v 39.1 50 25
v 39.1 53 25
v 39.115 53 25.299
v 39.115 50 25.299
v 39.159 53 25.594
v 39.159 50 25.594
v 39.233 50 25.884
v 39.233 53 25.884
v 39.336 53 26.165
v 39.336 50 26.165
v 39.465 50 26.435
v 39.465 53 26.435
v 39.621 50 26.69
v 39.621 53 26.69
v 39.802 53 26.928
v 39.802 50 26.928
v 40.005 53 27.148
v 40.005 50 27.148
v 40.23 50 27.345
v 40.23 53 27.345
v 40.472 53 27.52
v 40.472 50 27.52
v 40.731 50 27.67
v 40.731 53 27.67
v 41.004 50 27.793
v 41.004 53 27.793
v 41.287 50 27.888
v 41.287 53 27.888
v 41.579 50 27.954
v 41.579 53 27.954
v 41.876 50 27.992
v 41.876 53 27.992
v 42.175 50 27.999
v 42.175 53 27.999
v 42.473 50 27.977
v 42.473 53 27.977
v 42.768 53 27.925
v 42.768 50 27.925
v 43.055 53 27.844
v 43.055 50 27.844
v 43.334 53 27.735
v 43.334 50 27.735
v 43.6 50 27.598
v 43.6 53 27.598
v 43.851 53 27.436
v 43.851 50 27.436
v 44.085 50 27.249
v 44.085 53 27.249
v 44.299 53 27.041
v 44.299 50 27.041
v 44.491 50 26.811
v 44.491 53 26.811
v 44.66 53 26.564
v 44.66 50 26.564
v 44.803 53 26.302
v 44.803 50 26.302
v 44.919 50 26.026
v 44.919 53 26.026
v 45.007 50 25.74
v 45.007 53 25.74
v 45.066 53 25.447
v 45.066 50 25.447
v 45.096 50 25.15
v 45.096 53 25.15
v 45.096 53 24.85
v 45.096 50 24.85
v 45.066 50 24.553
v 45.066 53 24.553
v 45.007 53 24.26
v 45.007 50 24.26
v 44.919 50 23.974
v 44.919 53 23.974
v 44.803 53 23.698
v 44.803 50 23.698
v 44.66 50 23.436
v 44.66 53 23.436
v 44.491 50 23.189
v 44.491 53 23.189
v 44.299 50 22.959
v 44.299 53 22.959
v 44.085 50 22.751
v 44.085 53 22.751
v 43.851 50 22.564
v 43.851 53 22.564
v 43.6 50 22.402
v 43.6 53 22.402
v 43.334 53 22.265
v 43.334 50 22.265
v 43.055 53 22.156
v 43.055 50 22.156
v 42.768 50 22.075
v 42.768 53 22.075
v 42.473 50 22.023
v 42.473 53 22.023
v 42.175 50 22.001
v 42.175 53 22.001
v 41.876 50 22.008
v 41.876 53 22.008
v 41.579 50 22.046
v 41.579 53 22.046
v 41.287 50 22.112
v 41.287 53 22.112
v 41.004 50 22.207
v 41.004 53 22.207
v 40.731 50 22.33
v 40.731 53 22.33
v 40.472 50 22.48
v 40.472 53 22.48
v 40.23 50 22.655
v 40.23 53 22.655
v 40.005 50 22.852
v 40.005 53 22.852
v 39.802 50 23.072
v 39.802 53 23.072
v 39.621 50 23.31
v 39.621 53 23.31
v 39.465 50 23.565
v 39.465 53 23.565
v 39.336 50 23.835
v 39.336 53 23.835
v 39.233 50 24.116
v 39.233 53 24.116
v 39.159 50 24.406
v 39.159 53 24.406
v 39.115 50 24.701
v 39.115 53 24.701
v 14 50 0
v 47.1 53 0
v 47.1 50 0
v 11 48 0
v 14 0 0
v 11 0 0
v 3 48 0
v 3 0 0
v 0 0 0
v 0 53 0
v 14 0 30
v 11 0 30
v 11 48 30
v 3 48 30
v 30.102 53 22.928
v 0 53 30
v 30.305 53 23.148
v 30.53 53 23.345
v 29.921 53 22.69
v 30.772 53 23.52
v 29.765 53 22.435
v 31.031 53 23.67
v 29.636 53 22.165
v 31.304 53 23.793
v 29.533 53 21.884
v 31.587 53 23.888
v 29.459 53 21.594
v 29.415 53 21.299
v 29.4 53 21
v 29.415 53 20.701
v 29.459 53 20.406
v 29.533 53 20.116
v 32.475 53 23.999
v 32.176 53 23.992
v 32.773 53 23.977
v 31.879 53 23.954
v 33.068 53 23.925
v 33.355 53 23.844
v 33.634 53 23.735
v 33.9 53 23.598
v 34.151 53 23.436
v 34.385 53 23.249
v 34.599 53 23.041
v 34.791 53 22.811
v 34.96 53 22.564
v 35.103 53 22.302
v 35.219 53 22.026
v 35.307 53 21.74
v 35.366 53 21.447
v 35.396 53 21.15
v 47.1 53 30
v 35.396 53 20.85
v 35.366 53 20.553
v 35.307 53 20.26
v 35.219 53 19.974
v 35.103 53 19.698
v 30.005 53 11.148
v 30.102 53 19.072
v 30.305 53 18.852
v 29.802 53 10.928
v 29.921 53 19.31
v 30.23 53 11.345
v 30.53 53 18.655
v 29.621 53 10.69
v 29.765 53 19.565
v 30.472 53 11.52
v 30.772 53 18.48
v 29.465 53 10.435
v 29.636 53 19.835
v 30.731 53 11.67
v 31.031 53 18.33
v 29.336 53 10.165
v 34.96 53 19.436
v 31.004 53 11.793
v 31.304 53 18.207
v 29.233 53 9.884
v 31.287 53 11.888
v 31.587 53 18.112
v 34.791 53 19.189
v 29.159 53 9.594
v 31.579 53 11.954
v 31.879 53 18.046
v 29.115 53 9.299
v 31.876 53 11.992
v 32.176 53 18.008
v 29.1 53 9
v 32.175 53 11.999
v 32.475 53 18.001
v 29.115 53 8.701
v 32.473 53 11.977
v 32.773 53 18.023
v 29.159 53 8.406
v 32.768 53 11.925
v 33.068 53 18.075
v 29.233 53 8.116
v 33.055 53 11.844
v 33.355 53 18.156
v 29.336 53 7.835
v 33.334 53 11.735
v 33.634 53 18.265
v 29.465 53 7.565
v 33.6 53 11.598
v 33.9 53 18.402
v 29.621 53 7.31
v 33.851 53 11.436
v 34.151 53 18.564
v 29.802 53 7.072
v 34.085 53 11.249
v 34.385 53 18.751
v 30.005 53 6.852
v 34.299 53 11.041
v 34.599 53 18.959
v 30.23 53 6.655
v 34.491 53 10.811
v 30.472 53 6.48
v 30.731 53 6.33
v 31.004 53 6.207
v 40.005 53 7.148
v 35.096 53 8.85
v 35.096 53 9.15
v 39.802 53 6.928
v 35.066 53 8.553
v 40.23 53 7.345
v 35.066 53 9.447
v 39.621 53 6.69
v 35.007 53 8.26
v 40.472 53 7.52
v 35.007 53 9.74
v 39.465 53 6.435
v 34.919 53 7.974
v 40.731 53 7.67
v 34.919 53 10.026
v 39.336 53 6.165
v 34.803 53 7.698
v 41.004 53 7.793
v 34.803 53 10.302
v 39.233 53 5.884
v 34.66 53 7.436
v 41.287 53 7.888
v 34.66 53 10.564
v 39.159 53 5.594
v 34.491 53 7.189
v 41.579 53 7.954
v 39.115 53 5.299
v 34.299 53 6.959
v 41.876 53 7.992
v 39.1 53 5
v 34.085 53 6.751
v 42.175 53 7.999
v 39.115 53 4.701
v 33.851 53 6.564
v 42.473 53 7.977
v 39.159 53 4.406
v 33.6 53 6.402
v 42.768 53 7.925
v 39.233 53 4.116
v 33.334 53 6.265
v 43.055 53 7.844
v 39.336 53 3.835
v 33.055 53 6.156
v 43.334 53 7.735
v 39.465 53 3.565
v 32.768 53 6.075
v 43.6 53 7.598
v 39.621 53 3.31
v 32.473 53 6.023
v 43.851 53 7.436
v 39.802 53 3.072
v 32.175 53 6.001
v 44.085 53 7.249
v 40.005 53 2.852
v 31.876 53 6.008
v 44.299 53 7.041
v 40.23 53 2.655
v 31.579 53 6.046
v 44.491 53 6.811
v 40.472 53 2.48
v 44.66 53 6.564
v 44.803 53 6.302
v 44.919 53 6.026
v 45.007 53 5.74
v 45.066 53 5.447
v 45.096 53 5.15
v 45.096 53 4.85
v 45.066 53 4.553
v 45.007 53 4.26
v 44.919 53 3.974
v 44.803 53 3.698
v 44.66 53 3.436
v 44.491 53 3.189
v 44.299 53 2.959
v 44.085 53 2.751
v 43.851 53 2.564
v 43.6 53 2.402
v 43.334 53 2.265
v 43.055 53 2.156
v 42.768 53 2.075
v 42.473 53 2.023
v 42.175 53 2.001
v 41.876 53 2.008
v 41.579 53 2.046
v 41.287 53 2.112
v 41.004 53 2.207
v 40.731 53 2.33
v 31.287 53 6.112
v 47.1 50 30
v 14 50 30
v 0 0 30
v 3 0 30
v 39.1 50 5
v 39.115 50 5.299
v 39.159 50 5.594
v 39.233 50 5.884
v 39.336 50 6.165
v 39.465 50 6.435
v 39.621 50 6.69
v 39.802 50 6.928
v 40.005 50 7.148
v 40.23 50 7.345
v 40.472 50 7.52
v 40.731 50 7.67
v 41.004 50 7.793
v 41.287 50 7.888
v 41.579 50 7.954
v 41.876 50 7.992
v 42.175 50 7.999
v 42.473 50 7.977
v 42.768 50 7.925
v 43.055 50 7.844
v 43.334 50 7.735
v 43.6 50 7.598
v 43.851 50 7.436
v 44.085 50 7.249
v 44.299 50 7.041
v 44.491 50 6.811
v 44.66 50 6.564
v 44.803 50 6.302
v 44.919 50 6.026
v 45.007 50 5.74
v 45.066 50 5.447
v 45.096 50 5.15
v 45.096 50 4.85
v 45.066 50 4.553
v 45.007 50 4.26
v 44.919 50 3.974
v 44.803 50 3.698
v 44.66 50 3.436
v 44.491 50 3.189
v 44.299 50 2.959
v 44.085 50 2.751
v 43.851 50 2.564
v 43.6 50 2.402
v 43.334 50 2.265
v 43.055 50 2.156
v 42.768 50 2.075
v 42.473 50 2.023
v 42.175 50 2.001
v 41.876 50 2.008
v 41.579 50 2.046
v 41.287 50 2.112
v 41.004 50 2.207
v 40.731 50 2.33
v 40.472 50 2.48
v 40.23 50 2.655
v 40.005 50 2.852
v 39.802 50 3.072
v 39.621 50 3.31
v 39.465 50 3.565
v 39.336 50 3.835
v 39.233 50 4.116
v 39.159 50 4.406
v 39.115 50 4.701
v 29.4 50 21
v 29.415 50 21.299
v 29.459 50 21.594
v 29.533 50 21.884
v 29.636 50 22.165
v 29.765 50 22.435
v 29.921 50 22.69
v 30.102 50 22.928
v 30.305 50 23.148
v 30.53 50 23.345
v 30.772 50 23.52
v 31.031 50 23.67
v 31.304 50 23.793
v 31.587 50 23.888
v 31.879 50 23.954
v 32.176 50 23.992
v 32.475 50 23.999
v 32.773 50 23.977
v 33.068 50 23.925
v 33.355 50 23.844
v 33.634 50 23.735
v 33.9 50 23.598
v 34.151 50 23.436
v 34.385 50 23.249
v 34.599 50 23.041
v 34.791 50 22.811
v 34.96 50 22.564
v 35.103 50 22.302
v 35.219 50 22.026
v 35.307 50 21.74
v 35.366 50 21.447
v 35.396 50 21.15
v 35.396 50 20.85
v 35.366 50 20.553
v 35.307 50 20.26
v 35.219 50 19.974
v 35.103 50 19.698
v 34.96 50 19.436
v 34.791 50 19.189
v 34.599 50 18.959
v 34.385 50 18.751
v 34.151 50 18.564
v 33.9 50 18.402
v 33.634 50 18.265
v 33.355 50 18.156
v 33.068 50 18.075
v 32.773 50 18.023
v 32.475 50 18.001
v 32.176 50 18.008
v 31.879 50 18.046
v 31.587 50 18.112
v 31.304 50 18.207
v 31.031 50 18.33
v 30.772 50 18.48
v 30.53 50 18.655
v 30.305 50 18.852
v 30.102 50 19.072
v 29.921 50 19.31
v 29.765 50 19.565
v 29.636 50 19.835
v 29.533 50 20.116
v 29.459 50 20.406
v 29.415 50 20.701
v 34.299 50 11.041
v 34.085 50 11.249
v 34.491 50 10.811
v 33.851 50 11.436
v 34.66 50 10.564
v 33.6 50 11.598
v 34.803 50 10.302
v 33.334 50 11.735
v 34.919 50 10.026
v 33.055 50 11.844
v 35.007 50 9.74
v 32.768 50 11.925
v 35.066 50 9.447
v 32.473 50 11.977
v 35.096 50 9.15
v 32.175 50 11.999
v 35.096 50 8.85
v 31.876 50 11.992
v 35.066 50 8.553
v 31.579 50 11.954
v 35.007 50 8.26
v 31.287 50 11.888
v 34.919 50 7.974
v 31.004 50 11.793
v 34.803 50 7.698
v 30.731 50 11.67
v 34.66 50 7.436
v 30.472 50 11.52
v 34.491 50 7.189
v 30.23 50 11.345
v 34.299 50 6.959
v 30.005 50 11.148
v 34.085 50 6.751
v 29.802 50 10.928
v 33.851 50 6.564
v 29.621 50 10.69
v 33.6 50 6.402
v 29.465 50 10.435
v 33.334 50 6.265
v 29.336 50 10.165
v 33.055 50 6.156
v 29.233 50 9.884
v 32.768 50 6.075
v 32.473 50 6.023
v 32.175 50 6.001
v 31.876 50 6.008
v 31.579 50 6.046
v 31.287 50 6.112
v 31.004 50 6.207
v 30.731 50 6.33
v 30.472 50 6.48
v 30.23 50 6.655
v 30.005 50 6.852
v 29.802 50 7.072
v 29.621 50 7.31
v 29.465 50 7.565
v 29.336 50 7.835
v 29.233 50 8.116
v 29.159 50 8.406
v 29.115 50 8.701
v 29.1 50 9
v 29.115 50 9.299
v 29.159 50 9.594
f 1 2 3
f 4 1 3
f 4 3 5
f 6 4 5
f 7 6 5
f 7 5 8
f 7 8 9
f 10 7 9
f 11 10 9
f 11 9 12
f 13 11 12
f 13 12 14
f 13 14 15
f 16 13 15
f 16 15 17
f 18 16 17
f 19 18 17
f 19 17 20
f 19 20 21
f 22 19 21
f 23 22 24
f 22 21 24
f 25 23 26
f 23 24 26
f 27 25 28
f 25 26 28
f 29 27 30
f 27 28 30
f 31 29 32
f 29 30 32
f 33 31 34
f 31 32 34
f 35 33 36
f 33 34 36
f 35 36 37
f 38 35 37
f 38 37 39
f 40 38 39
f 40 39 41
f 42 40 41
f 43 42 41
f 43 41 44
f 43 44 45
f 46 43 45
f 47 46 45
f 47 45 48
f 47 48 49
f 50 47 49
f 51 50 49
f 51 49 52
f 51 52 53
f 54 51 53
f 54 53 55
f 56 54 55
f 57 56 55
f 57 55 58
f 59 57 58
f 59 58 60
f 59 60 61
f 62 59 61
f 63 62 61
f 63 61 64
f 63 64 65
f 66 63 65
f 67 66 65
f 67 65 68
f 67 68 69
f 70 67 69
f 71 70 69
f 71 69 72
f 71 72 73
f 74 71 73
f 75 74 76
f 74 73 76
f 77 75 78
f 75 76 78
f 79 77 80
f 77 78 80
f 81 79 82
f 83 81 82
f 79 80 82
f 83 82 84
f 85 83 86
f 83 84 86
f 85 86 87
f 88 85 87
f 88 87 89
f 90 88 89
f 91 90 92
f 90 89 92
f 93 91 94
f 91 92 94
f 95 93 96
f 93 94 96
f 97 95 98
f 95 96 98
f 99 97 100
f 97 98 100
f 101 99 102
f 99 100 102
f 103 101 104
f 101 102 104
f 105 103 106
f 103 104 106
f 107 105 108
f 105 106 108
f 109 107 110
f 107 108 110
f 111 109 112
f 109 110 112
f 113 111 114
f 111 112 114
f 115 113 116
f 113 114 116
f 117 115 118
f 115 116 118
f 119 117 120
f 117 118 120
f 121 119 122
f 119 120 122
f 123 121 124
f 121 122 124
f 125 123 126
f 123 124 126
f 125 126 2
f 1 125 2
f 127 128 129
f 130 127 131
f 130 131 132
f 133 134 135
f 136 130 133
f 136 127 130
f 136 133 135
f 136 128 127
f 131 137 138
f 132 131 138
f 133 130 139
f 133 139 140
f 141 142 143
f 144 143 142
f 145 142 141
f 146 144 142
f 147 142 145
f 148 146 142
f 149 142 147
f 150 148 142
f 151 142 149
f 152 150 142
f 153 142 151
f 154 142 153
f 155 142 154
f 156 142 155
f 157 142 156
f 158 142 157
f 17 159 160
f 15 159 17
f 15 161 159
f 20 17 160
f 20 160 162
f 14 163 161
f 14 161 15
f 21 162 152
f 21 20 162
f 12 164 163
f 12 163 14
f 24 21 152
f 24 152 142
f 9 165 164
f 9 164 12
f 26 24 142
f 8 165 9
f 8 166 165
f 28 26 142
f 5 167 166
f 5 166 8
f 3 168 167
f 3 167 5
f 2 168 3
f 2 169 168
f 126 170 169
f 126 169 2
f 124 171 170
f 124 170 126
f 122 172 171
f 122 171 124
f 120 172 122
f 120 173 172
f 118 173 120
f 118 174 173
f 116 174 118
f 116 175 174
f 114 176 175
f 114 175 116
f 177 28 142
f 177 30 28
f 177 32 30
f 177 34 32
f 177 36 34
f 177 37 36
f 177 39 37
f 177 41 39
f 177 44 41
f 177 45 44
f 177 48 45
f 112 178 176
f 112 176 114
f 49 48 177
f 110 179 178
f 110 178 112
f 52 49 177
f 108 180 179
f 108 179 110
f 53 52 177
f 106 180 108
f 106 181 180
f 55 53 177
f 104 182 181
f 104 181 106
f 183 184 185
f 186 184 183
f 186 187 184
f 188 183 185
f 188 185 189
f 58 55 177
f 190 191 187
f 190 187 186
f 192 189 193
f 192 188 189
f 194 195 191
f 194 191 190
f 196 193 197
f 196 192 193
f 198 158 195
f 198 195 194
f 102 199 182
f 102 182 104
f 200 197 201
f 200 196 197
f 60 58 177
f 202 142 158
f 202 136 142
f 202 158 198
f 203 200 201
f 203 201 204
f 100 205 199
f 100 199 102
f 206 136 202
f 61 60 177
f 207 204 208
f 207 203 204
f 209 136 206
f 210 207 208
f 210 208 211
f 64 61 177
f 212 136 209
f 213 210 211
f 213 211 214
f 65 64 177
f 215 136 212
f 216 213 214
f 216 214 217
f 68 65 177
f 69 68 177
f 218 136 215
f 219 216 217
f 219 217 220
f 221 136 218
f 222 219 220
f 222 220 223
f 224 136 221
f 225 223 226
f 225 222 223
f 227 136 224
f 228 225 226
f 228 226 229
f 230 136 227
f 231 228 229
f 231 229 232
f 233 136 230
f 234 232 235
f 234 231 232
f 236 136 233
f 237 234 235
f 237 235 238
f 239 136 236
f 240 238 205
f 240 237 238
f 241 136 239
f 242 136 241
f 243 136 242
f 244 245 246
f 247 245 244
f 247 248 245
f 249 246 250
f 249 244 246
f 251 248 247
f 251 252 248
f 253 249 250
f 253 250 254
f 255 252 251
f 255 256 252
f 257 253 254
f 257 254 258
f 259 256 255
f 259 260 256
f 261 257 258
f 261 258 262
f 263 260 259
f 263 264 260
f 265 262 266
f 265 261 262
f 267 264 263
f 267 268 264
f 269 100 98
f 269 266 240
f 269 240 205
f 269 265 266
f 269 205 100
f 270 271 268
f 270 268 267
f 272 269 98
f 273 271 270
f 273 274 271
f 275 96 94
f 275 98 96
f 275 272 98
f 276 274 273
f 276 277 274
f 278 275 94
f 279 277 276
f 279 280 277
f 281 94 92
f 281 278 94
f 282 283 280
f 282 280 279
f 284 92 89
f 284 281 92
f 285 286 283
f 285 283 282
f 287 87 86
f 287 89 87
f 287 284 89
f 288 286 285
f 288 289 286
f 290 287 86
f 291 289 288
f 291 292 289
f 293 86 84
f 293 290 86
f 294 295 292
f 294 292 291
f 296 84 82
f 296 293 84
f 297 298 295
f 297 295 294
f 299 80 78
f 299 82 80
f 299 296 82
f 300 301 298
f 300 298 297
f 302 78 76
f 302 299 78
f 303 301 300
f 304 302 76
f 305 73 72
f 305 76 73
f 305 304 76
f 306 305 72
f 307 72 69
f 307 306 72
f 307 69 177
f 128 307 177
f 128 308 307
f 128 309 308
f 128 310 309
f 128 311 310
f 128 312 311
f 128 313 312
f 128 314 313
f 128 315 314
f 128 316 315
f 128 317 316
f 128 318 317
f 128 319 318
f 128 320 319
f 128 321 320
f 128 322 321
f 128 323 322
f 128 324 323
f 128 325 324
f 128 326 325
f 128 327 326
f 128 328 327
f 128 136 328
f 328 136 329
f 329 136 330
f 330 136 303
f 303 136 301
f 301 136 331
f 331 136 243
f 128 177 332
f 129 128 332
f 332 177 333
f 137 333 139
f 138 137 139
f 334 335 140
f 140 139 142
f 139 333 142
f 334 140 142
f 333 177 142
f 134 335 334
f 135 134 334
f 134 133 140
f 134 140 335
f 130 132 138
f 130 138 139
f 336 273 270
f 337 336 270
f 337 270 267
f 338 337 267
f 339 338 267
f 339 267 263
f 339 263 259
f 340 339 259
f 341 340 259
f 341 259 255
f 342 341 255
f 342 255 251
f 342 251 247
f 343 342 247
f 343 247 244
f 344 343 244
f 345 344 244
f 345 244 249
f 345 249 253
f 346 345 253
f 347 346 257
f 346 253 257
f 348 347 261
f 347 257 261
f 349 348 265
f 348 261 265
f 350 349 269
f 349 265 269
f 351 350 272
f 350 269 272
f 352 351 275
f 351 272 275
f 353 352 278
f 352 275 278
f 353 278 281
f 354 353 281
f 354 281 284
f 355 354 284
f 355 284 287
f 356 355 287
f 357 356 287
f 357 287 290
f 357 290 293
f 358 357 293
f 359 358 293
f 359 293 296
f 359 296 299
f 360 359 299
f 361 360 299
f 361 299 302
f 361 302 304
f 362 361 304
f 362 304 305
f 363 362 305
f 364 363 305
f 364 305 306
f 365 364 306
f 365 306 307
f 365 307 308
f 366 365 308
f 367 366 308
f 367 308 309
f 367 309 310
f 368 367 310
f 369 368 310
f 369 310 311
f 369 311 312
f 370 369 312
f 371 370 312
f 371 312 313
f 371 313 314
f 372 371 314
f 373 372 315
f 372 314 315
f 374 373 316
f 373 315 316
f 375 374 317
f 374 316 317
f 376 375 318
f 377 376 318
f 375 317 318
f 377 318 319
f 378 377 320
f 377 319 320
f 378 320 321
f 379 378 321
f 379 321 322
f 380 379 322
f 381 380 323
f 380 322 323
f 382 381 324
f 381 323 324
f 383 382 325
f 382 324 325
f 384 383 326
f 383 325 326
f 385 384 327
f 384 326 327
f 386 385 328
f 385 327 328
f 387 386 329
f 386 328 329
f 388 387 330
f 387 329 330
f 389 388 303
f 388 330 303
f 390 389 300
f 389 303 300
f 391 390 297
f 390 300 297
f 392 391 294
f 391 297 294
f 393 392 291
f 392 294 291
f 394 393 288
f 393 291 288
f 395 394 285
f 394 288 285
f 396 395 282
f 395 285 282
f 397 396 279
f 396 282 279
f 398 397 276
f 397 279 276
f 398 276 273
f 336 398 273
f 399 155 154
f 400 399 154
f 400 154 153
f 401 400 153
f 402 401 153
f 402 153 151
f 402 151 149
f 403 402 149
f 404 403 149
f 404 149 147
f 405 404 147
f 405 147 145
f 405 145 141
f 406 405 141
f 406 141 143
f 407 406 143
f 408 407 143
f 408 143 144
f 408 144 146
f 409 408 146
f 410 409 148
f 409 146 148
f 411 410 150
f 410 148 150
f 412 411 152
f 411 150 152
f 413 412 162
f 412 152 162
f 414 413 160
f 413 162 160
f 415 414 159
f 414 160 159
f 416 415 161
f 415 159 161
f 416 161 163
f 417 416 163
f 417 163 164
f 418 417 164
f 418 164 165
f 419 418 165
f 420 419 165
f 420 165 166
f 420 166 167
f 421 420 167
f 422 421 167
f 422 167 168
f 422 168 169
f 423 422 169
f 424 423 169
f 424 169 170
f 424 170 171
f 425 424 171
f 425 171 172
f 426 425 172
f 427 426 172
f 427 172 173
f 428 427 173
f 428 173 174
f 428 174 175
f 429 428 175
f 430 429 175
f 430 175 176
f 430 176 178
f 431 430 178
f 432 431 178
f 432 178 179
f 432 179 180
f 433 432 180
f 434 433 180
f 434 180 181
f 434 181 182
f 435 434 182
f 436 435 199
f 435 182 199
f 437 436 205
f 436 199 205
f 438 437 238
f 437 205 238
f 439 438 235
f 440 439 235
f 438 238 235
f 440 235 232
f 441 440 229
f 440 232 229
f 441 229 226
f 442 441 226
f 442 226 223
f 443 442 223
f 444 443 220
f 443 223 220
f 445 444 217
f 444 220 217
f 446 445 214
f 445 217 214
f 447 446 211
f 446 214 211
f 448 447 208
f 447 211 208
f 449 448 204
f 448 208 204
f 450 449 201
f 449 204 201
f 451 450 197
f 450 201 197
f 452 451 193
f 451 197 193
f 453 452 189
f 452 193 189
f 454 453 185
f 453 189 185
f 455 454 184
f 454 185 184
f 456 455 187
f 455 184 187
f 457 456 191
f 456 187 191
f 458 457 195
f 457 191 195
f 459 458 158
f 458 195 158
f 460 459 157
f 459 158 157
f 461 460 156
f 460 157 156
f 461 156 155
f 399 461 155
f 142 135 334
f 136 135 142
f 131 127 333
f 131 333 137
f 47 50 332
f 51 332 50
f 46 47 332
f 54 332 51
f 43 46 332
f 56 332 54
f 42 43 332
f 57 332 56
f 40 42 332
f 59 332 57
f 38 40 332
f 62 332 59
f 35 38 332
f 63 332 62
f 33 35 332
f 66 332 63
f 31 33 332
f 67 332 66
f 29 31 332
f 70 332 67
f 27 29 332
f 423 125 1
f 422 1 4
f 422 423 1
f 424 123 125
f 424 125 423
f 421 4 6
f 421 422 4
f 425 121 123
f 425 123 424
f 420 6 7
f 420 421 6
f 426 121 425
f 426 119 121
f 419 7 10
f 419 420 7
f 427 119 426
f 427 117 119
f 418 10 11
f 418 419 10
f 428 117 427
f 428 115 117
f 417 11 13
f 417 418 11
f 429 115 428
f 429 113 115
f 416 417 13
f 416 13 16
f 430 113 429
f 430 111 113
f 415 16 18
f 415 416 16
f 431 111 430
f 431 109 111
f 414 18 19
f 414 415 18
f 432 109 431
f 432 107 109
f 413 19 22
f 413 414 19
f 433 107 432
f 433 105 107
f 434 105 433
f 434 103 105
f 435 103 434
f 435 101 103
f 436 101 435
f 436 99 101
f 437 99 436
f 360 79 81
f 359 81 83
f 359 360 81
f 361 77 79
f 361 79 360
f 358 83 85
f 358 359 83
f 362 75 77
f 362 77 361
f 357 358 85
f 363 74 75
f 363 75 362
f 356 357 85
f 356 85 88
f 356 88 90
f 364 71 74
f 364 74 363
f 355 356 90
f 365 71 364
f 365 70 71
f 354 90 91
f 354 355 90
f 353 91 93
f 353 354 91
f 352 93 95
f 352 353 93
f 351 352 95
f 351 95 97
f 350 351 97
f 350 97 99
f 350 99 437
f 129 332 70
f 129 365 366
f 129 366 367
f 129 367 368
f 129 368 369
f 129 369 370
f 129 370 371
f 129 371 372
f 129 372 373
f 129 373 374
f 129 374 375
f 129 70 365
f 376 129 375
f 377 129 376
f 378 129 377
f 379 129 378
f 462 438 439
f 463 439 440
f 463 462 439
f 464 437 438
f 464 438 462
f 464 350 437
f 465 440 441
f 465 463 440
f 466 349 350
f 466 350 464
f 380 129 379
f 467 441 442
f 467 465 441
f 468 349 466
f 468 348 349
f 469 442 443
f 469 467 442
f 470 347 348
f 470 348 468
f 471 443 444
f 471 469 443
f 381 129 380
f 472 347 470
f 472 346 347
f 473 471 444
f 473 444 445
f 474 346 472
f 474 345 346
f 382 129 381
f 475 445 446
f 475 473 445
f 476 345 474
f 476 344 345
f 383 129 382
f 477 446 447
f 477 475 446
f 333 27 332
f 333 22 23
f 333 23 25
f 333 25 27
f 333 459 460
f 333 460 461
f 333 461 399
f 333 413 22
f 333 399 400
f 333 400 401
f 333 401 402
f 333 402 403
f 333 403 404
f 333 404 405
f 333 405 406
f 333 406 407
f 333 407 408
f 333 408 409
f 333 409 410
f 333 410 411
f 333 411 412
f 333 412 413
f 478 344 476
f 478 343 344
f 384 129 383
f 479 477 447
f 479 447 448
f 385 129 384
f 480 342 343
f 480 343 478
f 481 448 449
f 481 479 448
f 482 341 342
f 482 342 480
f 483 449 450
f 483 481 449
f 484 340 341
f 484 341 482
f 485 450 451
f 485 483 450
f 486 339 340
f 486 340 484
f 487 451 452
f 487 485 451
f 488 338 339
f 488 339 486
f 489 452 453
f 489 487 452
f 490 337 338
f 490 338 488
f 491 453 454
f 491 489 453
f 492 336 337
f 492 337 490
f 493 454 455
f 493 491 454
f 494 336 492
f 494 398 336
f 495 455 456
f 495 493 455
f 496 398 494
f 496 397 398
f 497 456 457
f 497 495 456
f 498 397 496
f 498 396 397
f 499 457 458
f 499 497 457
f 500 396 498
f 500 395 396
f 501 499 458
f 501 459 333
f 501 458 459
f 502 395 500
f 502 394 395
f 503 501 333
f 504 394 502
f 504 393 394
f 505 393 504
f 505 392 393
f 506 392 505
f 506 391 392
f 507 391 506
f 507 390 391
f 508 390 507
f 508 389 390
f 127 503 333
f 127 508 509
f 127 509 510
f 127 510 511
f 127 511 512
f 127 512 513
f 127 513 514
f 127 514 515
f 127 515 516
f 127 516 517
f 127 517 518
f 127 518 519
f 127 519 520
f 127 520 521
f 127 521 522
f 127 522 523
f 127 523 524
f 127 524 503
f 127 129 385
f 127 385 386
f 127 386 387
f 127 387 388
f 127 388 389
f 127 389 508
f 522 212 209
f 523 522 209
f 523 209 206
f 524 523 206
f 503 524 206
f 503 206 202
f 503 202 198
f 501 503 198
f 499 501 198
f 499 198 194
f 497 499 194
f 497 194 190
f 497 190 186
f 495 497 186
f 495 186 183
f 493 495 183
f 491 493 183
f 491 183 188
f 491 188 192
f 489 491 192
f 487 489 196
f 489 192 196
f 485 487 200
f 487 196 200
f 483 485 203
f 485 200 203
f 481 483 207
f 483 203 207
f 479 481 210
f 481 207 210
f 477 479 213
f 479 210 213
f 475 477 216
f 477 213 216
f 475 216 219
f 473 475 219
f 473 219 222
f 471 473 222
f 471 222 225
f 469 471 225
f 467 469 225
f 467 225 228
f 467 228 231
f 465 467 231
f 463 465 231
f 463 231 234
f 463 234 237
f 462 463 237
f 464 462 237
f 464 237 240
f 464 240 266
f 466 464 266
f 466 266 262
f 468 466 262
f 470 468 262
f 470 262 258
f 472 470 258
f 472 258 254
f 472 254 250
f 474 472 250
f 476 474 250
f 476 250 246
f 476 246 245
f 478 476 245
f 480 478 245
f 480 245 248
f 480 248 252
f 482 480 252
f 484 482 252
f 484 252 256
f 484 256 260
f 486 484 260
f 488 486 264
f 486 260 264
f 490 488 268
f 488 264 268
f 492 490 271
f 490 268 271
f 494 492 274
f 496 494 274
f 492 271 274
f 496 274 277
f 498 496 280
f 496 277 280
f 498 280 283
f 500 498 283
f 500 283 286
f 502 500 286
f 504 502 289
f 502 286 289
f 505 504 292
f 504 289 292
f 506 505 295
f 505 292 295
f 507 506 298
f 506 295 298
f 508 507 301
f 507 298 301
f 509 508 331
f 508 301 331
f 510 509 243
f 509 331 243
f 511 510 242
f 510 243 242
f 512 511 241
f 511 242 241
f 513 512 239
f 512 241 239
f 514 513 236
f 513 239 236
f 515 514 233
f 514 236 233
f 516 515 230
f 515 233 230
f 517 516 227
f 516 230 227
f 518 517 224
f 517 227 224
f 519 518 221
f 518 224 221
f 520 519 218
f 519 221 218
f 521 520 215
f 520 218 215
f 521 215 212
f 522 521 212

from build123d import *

# Parameters (mm, degrees)
PAD_DEPTH    = 30
SKETCH001_R  = 3
POCKET_DEPTH = 5


with BuildPart() as part:
    # Sketch → Pad (new body)
    with BuildSketch(Plane.XY):
        Polygon((0, 0), (0, 53), (47.1, 53), (47.1, 50), (14, 50), (14, 0), (11, 0), (11, 48), (3, 48), (3, 0), align=None)
    extrude(amount=PAD_DEPTH)

    # Sketch001 (on Face2 of Pad) → Pocket (cut)
    with BuildSketch(Plane(origin=(0, 53, 0), x_dir=(-1, 0, 0), z_dir=(0, 1, 0))):
        with Locations((-32.1, 9)):
            Circle(SKETCH001_R)
        with Locations((-42.1, 25)):
            Circle(SKETCH001_R)
        with Locations((-42.1, 5)):
            Circle(SKETCH001_R)
        with Locations((-32.4, 21)):
            Circle(SKETCH001_R)
    extrude(amount=-POCKET_DEPTH, mode=Mode.SUBTRACT)


solid = part.part
